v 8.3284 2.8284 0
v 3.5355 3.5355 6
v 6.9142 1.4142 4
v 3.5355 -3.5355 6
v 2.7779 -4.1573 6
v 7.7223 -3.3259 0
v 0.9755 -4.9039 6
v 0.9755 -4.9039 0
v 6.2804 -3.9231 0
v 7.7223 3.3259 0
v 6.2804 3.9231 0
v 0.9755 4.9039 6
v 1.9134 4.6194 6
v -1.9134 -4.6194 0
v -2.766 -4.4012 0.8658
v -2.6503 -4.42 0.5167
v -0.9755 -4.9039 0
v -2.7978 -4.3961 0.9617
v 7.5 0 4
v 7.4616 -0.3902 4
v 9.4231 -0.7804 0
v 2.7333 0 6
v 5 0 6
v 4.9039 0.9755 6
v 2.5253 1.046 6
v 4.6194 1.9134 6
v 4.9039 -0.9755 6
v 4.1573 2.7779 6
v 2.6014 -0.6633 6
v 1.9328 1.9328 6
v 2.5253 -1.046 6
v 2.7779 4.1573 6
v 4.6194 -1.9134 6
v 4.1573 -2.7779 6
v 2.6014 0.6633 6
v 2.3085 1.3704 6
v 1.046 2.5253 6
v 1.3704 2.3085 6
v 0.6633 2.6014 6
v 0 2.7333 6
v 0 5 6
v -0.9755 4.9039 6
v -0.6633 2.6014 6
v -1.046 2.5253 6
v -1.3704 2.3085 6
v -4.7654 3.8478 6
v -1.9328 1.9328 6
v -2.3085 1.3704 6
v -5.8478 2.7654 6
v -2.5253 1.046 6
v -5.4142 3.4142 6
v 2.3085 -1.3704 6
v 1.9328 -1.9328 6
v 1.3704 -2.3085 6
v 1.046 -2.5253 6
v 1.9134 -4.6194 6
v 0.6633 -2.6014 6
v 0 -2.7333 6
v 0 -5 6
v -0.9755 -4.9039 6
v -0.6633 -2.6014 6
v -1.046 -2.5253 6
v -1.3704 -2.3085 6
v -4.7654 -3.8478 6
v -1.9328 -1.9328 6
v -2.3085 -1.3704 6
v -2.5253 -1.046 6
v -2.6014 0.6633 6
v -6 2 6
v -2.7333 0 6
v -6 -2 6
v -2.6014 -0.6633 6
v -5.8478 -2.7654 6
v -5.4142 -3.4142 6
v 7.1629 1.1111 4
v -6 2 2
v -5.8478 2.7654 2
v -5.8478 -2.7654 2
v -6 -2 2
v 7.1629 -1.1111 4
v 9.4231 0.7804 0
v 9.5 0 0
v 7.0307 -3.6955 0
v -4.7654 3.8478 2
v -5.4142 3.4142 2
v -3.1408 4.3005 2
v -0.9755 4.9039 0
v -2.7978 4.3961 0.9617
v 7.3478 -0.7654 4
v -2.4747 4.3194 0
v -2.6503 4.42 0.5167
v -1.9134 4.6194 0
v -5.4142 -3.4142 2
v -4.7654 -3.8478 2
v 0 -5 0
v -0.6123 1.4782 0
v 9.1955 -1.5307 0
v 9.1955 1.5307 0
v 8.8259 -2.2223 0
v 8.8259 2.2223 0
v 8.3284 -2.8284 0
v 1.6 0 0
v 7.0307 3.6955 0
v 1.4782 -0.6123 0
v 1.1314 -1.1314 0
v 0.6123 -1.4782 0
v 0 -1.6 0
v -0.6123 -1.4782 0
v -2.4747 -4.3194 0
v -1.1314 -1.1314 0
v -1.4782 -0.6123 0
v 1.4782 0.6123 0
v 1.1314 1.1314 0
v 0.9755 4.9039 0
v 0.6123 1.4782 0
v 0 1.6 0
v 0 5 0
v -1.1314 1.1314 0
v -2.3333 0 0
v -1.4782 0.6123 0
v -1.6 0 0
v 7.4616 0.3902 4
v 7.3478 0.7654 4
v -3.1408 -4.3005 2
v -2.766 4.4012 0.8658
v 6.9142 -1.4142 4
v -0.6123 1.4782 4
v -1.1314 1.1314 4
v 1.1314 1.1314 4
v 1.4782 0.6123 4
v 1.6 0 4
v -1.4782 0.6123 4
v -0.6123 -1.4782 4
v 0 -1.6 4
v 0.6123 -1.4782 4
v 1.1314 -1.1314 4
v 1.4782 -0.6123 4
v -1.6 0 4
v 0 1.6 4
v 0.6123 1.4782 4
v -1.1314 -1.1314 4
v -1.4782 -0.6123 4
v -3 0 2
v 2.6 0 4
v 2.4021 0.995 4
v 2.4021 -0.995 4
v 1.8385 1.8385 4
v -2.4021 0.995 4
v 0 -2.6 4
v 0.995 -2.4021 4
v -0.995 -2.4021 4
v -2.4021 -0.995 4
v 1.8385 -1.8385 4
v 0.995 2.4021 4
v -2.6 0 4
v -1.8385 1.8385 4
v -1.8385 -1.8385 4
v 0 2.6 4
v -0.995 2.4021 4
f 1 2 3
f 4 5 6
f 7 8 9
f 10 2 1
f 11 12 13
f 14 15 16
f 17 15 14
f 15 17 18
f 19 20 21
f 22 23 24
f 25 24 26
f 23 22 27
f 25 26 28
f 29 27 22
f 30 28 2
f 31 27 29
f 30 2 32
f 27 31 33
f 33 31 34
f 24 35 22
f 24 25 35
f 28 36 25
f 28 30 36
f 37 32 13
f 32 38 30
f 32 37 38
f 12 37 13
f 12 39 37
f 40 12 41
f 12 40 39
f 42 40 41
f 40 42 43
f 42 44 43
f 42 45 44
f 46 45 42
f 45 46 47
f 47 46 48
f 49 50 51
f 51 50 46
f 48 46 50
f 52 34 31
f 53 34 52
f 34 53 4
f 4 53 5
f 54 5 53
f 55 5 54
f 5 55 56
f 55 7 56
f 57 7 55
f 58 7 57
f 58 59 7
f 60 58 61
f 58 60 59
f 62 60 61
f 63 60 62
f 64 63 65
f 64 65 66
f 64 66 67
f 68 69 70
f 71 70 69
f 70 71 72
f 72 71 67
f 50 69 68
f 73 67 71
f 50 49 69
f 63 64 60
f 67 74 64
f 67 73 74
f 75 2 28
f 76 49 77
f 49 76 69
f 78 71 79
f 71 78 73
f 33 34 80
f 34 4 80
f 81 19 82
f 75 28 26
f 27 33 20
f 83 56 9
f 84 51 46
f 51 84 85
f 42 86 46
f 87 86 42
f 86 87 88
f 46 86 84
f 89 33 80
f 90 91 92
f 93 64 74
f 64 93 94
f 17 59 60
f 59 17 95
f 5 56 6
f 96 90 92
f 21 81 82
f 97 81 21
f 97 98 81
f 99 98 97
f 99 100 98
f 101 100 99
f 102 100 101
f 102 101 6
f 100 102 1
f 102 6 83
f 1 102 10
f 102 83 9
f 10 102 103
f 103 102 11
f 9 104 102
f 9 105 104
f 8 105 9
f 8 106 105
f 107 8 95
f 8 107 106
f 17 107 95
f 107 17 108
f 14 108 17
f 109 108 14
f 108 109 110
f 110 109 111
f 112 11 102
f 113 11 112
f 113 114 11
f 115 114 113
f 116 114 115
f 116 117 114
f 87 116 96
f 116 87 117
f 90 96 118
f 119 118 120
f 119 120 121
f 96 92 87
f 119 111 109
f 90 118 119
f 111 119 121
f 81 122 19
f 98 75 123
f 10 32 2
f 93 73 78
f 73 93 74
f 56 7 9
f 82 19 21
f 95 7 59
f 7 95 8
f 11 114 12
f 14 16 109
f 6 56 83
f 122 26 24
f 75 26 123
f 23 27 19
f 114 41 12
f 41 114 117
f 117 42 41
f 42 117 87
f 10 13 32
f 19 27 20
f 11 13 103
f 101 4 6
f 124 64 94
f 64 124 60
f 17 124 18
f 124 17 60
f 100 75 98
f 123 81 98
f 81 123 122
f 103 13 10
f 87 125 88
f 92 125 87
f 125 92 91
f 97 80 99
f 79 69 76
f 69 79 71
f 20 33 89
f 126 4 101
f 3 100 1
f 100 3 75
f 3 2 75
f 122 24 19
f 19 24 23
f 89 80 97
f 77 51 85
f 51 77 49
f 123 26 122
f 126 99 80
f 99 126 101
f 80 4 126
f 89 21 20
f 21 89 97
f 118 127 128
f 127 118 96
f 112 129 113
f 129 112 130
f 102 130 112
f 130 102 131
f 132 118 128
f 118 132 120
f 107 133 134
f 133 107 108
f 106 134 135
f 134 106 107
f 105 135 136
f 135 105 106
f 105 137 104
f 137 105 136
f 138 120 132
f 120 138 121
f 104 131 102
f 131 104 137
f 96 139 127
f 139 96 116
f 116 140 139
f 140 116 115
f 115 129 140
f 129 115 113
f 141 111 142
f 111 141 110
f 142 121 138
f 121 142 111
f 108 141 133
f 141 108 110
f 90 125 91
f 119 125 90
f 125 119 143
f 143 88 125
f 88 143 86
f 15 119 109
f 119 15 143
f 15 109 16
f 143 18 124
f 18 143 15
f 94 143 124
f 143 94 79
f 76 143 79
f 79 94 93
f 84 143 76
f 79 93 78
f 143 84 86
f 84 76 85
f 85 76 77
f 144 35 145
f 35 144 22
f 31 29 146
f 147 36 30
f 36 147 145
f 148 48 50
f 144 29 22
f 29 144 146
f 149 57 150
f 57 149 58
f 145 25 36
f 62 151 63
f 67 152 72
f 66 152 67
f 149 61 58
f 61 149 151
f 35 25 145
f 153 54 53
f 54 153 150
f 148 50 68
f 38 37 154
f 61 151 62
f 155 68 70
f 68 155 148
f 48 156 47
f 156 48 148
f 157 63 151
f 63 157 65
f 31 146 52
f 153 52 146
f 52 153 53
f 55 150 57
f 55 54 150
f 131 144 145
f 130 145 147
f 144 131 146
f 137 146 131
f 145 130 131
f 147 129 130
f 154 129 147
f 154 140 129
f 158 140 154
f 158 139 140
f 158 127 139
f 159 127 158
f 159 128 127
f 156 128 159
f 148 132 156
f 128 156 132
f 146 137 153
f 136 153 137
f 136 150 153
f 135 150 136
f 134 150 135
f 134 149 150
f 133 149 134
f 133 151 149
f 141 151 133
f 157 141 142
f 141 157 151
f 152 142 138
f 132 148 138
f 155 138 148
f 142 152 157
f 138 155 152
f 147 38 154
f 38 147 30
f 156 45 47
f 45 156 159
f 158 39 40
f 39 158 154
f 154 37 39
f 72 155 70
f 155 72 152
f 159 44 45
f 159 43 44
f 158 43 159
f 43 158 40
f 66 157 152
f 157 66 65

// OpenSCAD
// clip(s) to hold bed to frame

RES=32;  // larger for production render

bedClip15();

module bedClip15() difference() {  // for 15mm extrusions
    //union() {  don't do this.  often used pointing at an angle
    //    translate([6,0,-1.5]) hull() pairX(1) cylinder(r1=1,r2=2,h=2,$fn=RES/2);
    hull() { 
        translate([-4,0,2]) pairY(2) cylinder(r=2,h=4,$fn=RES/2);
        cylinder(r=5,h=6,$fn=RES);
        translate([5.5,0,0]) cylinder(r1=4,r2=2,h=4,$fn=RES);
    }
    
    cylinder(r=1.6,h=40,center=true, $fn=RES/2);  // M3 screw hole, with slop
    translate([-180,0,-1]) cylinder(r1=178,r2=177,h=3, $fn=3*RES);
    translate([0,0,4]) cylinder(r1=2.6,r2=3,h=6,$fn=RES/2);
}

module pairX(d) for(a=[-d,d]) translate([a,0,0]) children();
module pairY(d) for(a=[-d,d]) translate([0,a,0]) children();
